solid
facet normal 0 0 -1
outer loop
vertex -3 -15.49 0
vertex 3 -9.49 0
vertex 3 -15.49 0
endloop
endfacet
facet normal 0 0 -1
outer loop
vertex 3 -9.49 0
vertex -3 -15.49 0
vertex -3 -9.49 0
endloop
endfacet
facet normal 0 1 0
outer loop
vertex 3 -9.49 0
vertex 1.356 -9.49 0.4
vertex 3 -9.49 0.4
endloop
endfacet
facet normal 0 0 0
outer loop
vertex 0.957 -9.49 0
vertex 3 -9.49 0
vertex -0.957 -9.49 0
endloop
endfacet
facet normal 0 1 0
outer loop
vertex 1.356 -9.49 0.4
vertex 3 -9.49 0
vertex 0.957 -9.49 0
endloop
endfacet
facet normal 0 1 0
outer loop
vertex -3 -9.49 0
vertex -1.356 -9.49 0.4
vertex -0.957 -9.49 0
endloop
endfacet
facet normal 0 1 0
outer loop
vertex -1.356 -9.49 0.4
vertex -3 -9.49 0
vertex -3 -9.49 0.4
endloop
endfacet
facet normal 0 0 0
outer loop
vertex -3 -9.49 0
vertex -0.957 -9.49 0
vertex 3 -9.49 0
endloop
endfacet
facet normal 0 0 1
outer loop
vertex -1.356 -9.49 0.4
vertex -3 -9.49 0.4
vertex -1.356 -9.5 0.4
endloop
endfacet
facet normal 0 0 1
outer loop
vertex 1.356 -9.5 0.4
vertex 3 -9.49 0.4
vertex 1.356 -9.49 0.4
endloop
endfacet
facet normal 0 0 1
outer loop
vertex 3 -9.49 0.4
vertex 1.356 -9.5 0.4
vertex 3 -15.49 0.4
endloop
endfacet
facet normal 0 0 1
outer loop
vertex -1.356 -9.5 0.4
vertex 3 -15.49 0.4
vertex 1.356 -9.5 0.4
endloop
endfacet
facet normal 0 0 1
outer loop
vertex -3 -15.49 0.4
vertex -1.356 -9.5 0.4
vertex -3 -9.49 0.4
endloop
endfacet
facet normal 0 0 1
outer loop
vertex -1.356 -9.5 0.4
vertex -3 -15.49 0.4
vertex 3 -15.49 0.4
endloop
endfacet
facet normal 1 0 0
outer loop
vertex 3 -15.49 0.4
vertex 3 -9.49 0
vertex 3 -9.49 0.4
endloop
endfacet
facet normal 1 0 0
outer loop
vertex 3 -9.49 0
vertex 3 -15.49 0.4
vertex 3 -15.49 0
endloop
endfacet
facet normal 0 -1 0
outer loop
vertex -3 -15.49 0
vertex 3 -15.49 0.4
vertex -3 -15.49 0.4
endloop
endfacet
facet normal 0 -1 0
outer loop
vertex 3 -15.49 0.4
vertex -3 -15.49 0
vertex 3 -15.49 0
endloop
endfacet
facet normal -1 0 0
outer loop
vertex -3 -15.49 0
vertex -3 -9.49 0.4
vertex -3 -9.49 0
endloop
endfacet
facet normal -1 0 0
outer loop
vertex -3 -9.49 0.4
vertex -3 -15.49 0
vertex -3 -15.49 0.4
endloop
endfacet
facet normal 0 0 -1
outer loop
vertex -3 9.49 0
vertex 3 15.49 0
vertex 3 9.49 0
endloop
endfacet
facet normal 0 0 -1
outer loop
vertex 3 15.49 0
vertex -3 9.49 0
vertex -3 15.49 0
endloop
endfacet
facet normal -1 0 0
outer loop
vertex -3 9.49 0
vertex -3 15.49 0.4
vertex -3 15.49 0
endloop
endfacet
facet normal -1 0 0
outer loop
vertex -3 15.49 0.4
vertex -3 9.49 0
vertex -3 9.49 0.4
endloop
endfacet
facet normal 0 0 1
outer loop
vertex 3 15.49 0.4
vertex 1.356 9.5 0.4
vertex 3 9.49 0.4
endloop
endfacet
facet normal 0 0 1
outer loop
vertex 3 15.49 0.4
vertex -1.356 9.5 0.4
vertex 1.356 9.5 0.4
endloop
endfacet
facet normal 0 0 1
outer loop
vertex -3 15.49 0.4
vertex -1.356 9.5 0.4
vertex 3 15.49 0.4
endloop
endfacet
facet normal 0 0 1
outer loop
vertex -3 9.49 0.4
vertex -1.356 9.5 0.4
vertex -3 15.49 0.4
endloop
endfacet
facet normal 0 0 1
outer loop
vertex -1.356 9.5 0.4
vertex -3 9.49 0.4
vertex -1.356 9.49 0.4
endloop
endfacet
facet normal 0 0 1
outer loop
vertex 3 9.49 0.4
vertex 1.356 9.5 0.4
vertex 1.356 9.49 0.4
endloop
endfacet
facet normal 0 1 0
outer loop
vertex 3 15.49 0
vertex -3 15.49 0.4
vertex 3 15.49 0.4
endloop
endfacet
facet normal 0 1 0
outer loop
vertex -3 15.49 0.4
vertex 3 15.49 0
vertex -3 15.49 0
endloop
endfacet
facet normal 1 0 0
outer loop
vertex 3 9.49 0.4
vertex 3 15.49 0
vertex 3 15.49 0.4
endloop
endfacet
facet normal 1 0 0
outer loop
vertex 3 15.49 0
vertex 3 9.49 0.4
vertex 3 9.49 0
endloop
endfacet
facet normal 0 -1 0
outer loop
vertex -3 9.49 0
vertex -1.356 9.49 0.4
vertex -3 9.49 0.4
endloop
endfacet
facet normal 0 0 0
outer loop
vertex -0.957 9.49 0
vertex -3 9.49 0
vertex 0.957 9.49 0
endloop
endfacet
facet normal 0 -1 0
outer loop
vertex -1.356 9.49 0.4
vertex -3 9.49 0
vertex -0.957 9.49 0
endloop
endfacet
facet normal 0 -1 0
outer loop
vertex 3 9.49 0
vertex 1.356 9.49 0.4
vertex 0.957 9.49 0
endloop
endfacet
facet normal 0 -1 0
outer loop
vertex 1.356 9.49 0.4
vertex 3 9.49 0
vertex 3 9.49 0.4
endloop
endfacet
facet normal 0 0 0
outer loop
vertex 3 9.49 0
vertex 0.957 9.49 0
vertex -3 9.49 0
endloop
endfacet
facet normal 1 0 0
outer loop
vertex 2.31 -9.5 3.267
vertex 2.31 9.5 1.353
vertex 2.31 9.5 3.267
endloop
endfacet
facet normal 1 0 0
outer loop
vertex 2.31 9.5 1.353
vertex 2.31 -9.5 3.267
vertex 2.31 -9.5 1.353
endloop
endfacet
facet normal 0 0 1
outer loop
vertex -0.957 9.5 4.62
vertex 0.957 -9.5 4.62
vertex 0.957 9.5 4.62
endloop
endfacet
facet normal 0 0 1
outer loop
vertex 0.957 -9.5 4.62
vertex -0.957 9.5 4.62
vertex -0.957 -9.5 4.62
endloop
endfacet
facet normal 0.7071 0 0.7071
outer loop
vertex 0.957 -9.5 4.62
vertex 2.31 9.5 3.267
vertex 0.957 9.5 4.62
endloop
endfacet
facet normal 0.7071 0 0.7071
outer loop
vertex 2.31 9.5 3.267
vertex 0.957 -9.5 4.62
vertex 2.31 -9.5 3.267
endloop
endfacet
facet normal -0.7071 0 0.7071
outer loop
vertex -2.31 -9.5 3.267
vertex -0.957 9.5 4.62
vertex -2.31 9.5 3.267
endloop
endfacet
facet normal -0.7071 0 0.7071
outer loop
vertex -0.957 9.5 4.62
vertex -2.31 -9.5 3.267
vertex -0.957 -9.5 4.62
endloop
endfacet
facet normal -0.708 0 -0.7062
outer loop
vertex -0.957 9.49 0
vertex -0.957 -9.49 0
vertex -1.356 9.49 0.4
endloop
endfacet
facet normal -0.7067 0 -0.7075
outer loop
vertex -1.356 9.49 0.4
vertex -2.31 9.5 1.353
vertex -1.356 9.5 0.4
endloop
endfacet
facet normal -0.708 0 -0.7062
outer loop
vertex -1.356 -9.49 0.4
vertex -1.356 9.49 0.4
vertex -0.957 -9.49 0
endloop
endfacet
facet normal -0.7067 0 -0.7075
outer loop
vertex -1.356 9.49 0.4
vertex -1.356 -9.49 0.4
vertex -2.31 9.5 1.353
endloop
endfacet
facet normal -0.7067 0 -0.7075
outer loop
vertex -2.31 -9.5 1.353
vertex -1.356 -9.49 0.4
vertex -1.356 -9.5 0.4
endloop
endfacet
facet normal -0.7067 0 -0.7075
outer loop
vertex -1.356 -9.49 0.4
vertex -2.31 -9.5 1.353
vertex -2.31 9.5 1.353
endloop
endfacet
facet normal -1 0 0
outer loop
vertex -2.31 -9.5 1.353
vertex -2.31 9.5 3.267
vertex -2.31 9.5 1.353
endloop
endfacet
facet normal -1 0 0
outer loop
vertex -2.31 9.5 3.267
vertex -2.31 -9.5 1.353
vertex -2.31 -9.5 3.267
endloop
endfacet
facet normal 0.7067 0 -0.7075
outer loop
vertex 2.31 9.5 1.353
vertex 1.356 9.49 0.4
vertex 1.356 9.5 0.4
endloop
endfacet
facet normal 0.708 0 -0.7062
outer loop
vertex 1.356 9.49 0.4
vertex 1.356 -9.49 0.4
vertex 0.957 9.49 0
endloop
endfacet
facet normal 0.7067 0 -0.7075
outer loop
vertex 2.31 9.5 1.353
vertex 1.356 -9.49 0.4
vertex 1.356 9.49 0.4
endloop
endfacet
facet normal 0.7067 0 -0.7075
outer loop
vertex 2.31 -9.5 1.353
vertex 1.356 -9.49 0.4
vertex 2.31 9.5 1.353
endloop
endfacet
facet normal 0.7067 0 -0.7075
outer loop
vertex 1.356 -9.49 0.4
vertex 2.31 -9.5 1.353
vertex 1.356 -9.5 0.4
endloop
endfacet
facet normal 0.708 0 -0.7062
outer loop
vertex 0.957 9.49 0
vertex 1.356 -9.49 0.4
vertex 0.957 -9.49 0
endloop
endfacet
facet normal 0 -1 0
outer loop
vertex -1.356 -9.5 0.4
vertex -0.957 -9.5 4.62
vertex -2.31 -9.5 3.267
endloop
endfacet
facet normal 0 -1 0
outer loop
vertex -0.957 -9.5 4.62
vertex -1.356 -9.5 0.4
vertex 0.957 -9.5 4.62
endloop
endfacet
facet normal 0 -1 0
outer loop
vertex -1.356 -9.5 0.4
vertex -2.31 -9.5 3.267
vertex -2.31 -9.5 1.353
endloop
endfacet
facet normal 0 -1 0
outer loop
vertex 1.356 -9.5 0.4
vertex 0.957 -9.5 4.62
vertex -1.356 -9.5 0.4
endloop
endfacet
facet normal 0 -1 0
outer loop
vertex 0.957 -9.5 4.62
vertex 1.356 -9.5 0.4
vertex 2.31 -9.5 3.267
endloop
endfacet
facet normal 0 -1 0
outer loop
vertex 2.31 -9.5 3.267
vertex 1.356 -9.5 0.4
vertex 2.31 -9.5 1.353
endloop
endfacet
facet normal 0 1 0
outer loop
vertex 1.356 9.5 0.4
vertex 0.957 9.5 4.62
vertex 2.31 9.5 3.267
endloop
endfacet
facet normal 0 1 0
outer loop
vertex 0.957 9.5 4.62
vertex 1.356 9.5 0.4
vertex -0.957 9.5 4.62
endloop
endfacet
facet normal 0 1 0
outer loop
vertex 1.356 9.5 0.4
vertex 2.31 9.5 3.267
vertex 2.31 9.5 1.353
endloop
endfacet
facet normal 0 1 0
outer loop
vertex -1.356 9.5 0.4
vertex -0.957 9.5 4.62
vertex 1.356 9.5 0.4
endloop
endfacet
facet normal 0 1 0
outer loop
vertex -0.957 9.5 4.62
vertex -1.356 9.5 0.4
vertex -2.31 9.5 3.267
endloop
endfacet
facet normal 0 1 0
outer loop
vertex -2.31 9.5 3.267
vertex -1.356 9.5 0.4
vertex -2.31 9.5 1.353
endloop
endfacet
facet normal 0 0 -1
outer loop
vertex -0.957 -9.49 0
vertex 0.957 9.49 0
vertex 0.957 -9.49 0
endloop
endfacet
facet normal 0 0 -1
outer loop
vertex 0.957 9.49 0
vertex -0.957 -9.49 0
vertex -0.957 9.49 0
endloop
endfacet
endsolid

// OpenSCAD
length = 19;
d = 5;
$fn = 8;

translate([0, length/2, d*0.462])
  rotate([90, 0, 0])
    rotate([0, 0, 360/16])
      cylinder(h=length, d=d);

for (a = [-1, 1])
  scale([1, a, 1])
    translate([0, length/2 + 2.99])
      linear_extrude(0.4)
        square(6, center=true);
